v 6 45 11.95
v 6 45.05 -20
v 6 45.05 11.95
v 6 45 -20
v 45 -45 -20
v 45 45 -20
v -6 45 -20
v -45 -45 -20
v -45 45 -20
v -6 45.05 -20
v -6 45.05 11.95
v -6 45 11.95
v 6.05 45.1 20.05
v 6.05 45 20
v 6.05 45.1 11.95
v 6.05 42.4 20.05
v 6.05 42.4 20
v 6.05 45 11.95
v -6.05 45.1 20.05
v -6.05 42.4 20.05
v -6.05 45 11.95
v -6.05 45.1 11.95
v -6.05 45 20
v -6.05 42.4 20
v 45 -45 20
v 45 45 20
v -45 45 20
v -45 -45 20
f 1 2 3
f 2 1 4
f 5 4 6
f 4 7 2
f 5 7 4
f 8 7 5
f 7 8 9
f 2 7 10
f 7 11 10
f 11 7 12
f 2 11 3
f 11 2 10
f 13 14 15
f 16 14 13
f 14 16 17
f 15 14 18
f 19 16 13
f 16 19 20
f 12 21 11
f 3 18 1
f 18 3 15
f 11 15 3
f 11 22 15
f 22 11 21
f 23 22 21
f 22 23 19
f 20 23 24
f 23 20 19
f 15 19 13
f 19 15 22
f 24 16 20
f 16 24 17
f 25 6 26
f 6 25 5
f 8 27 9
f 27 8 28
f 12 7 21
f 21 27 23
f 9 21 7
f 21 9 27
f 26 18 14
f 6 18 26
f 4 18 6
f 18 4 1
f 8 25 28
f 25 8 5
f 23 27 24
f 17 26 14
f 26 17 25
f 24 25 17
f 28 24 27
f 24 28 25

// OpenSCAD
// Dimensions for DIY Magnetic Stirrer Housing
// Units: mm

// Overall Dimensions
outer_x = 90;
outer_y = 90;
wall_thickness = 2.5;
top_plate_thickness = 2;

// Fan Mounting Pattern
fan_hole_spacing = 71.5;
fan_hole_diameter = 4.5;
fan_hole_offset = (fan_hole_spacing - fan_hole_diameter) / 2;

// Cable Notch
notch_width = 12;
notch_depth = 8;
notch_z_start = 32; // From open edge (z=40) downwards

// Derived Dimensions
inner_x = outer_x - (wall_thickness * 2);
inner_y = outer_y - (wall_thickness * 2);
inner_z = 40;

// Fan hole coordinates (centered on 0,0)
fan_holes = [
    [-fan_hole_offset, -fan_hole_offset],
    [fan_hole_offset, -fan_hole_offset],
    [-fan_hole_offset, fan_hole_offset],
    [fan_hole_offset, fan_hole_offset]
];

$fn = 64;

// Main Housing Assembly
module stirrer_housing() {
    union() {
        // 1. Top Plate (Base)
        translate([0, 0, 0])
            cube([outer_x, outer_y, top_plate_thickness], center = true);

        // 2. Walls
        // We build the walls as a single block and subtract the top plate
        // to ensure perfect alignment and clean edges.
        wall_block_height = inner_z;
        
        // Create the solid block for walls
        wall_block_x = outer_x;
        wall_block_y = outer_y;
        
        // We need to cut the top plate out of the walls, so we start with
        // a block that includes the top plate thickness, then subtract it.
        // However, the prompt says "walls rise from it". 
        // To ensure the top plate is exactly 2mm thick and walls start at z=0,
        // we will model the walls starting at z=0.
        
        // Wall Block (Full height)
        translate([0, 0, 0])
            cube([wall_block_x, wall_block_y, wall_block_height], center = true);

        // Cut out the top plate from the wall block
        // This creates the cavity where the top plate sits, leaving the walls
        // rising from z=0.
        translate([0, 0, top_plate_thickness / 2])
            cube([outer_x, outer_y, top_plate_thickness + 0.1], center = true);

        // 3. Fan Mounting Holes
        // Cut holes through the top plate and walls
        for (pos = fan_holes) {
            translate([pos[0], pos[1], top_plate_thickness / 2])
                cylinder(d = fan_hole_diameter + 0.1, h = top_plate_thickness + 0.1, center = true);
        }

        // 4. Cable Notch
        // Located on one wall (e.g., the wall at +Y)
        // The notch is 12mm wide, centered along the wall.
        // It reaches 8mm down from the open edge (z=40).
        // So it spans z = 32 to 40.
        
        // Position the notch on the +Y wall
        // The wall is at y = outer_y/2 - wall_thickness/2
        notch_y_pos = (outer_y / 2) - (wall_thickness / 2);
        
        // The notch is centered along the wall (X axis)
        notch_x_pos = 0;
        
        // The notch depth is 8mm. 
        // Since the wall thickness is 2.5mm, the notch cuts through the wall.
        // We cut a rectangular slot.
        
        translate([notch_x_pos, notch_y_pos, 0]) {
            // We cut a slot that goes from z=0 up to z=40.
            // But we only want it to be 8mm deep (32 to 40).
            // We cut a tall slot and then subtract the bottom part.
            
            // Cut the tall slot
            translate([0, 0, 0])
                cube([notch_width, wall_thickness + 0.1, inner_z], center = true);
            
            // Subtract the bottom part to make it 8mm deep
            translate([0, 0, (inner_z - notch_depth) / 2])
                cube([notch_width + 0.1, wall_thickness + 0.2, notch_depth + 0.1], center = true);
        }
    }
}

// Render the part
stirrer_housing();
